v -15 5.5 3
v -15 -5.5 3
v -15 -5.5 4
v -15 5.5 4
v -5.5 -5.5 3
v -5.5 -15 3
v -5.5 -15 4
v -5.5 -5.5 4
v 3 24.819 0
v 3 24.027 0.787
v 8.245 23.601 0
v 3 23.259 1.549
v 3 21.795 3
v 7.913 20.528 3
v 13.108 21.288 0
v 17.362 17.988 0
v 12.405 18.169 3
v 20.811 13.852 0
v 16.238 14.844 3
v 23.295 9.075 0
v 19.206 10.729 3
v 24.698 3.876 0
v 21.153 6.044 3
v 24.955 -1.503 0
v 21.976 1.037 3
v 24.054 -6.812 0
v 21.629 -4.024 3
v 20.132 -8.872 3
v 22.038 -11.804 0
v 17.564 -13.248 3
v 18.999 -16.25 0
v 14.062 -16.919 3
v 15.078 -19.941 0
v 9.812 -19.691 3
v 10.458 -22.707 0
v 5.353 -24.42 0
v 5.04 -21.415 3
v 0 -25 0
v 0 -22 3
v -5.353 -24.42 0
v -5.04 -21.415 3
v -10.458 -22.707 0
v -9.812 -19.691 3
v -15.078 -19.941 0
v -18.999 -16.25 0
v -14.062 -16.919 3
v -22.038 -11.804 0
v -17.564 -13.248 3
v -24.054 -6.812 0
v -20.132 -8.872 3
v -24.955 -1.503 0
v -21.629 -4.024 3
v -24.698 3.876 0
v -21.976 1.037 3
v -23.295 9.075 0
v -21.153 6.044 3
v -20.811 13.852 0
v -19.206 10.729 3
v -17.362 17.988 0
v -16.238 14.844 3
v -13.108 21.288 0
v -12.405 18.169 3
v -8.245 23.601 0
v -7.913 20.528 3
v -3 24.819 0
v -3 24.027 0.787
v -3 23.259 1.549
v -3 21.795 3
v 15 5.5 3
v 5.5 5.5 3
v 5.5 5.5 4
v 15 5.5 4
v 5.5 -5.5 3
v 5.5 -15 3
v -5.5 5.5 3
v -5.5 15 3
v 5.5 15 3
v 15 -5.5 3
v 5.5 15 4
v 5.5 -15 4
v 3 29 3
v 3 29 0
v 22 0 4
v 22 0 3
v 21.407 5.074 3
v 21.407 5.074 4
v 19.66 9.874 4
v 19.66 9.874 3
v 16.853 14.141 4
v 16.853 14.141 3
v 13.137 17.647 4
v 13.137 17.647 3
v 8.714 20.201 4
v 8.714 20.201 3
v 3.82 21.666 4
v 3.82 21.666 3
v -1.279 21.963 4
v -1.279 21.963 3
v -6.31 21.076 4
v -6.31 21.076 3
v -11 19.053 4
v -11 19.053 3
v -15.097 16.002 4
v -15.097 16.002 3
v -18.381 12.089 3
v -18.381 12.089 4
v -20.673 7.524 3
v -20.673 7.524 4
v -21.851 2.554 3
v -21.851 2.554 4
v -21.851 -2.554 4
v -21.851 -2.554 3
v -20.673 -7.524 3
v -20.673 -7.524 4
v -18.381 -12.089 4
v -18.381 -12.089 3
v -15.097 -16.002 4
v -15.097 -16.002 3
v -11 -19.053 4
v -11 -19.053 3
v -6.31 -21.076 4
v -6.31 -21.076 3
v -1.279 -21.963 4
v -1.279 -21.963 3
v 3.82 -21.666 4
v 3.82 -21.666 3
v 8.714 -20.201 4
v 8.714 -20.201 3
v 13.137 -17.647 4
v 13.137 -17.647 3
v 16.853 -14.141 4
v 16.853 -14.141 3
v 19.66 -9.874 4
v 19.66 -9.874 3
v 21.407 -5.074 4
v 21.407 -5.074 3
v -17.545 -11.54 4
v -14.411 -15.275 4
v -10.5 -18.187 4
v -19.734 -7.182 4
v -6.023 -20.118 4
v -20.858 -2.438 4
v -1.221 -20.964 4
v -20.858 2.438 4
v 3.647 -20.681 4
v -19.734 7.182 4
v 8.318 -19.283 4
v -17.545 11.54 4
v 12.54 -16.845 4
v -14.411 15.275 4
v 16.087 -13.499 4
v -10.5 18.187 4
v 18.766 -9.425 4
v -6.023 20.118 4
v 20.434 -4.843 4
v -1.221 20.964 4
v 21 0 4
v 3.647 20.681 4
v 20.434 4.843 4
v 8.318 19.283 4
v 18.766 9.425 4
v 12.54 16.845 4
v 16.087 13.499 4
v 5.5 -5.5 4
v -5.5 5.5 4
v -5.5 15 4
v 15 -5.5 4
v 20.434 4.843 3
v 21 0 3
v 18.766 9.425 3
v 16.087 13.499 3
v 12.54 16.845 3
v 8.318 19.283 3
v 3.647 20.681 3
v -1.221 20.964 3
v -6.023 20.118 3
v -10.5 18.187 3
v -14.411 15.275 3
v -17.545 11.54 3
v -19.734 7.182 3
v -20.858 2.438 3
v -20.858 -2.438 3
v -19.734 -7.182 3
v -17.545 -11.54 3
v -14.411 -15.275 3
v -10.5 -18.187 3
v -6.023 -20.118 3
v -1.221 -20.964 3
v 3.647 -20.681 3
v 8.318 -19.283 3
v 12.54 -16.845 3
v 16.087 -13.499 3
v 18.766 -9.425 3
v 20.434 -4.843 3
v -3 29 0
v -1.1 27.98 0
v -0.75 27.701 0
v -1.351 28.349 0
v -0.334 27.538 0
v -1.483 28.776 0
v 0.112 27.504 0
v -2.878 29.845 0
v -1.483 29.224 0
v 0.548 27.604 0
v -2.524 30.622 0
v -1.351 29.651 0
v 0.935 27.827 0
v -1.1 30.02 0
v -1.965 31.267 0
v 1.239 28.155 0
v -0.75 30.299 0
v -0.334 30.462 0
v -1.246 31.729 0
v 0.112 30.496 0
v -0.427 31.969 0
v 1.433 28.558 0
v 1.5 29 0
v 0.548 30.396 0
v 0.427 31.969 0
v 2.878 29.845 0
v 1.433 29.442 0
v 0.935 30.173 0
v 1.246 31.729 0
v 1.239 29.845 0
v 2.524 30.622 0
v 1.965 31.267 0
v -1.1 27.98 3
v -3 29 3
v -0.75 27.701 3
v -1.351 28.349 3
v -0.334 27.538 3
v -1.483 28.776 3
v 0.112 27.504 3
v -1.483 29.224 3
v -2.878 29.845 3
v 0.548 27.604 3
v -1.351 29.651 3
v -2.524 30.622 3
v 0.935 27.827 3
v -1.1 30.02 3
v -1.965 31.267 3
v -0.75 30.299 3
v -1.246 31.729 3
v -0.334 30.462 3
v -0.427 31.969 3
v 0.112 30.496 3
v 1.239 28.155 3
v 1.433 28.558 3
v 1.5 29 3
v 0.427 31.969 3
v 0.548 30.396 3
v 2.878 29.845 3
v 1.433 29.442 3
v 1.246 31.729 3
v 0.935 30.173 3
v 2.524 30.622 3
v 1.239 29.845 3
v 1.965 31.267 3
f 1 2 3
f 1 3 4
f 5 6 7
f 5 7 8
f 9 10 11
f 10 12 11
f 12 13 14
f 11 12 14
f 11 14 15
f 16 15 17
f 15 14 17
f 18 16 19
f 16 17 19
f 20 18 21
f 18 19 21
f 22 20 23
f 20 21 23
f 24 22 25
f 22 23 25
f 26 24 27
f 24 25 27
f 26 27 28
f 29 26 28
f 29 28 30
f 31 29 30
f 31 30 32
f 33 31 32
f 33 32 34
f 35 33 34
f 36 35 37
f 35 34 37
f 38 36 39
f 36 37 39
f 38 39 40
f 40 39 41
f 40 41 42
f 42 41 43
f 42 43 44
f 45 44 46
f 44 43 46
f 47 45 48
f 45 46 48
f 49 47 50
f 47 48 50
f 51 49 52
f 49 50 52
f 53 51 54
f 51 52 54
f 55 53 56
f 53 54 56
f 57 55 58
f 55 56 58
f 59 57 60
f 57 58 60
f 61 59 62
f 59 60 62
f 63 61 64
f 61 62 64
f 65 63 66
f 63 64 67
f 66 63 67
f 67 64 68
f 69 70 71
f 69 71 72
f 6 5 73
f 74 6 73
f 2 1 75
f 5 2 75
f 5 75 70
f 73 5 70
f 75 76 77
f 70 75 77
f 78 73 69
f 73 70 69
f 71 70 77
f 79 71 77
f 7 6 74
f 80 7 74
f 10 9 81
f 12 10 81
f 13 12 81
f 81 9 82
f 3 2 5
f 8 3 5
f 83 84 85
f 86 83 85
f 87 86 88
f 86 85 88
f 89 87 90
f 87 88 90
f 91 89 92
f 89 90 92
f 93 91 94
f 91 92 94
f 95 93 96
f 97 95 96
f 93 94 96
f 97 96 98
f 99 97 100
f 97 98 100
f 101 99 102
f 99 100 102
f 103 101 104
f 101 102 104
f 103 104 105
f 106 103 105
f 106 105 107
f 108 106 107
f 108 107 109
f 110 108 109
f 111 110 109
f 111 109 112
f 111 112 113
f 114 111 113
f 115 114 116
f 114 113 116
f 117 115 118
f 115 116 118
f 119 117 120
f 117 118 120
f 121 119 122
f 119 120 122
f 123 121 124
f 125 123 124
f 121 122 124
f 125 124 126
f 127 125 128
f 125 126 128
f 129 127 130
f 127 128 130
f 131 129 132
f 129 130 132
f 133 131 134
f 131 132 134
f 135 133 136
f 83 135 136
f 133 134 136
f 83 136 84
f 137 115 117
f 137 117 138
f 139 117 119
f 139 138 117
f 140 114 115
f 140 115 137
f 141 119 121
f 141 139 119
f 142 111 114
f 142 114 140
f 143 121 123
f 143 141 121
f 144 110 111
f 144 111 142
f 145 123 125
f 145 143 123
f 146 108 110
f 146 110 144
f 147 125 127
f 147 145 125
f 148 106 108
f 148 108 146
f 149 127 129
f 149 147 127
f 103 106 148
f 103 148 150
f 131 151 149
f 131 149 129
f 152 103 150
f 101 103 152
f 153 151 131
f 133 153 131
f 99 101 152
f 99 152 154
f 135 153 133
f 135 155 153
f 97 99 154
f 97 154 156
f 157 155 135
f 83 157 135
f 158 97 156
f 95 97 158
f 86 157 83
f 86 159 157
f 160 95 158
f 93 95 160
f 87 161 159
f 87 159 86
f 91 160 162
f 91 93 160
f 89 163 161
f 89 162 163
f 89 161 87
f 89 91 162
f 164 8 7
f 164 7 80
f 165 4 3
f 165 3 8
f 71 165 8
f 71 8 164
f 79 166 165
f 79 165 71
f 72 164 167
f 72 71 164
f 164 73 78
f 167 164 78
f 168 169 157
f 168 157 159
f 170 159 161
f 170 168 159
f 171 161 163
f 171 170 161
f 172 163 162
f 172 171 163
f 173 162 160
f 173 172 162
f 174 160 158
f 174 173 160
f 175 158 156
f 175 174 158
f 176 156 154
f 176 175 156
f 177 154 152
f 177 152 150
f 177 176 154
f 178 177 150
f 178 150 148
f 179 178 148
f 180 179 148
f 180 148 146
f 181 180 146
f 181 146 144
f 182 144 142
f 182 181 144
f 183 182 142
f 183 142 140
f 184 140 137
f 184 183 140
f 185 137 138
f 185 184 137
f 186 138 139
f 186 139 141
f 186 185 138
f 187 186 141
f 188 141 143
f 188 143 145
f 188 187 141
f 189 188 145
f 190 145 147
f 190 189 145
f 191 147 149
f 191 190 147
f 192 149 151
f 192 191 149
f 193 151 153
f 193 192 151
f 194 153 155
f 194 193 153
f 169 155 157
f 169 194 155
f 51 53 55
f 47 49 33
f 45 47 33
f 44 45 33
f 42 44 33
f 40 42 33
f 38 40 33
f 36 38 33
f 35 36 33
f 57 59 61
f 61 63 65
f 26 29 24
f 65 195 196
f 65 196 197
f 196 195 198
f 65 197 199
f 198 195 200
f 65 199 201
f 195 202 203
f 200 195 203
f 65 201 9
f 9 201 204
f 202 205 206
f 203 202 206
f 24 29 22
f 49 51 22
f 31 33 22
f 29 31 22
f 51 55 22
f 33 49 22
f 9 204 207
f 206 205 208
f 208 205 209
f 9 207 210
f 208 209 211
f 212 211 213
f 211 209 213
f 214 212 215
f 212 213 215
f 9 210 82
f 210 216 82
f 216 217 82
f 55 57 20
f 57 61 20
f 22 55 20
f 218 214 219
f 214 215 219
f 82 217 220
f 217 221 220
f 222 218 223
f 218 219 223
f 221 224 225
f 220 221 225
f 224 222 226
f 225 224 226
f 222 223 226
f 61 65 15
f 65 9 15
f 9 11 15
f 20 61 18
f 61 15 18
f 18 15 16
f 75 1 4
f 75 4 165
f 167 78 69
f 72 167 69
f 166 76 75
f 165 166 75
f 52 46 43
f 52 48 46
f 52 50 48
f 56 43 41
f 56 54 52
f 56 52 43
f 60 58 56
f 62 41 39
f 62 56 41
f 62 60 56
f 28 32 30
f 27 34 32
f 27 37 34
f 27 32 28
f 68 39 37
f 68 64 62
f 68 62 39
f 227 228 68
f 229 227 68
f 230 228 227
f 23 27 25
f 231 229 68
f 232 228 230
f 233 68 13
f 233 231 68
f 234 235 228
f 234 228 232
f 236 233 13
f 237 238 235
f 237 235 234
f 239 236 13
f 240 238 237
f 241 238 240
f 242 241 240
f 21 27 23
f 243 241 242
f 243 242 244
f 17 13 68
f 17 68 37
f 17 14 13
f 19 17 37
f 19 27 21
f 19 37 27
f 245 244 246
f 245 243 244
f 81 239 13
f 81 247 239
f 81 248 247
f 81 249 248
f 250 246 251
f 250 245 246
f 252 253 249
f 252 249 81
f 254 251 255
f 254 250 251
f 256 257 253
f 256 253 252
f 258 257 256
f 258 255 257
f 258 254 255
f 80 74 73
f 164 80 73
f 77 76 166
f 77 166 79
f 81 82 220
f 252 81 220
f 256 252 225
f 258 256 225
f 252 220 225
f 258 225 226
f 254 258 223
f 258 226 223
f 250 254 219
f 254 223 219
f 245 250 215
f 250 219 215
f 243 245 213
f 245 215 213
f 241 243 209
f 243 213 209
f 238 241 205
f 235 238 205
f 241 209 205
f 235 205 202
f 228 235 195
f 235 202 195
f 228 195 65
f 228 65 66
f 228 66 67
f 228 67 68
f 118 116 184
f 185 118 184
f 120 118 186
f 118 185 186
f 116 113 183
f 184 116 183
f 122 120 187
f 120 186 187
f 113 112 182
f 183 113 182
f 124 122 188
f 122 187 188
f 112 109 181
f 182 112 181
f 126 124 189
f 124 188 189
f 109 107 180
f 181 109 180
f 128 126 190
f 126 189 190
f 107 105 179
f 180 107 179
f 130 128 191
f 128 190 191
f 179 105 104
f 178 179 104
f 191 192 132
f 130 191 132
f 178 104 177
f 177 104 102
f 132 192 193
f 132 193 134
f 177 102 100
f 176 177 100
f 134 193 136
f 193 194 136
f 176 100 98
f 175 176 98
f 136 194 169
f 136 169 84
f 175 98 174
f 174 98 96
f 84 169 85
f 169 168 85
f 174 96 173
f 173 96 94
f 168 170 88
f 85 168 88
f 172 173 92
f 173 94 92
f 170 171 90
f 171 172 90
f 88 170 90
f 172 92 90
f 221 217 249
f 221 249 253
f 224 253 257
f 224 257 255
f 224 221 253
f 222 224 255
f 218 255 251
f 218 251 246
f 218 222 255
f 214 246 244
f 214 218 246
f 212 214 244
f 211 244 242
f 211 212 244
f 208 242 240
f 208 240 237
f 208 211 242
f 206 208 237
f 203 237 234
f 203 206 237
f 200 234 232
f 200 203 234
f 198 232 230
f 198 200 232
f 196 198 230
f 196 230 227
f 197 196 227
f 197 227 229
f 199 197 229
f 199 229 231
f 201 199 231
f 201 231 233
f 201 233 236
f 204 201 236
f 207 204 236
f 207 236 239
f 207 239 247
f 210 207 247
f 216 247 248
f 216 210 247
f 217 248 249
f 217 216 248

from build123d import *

# Parameters (mm, degrees)
F0_R     = 25
F1_DEPTH = 3
F2_W     = 11
F2_H     = 11
F2_H_2   = 9.5
F2_W_2   = 9.5
F3_DEPTH = 1
F2_R     = 22
F2_R_2   = 21
F4_R     = 1.5
F5_DEPTH = 3
F6_SIZE  = 2.99999


# Not quite as in the source:
# - a fillet or chamfer is up to 0.001 mm smaller than in the source, because OpenCascade refuses the exact size


with BuildPart() as f1:
    # F0 (on Top) → F1 (new body)
    with BuildSketch(Plane.XY):
        Circle(F0_R)
    extrude(amount=F1_DEPTH)

    # F4 (on Top) → F5 (join, through all)
    with BuildSketch(Plane.XY):
        with BuildLine():
            Line((3, 24.819347292), (3, 29))
            ThreePointArc((3, 29), (0, 26), (-3, 29))
            Line((-3, 29), (-3, 24.819347292))
            ThreePointArc((-3, 24.819347292), (0, 25), (3, 24.819347292))
        make_face()
        with BuildLine():
            ThreePointArc((-3, 29), (0, 26), (3, 29))
            ThreePointArc((3, 29), (0, 32), (-3, 29))
        make_face()
        with Locations((0, 29)):
            Circle(F4_R, mode=Mode.SUBTRACT)
    extrude(amount=F5_DEPTH)

    # F6 (size 3 in the source; OpenCascade refuses exactly that, so slightly less here)
    f6_edges = [f1.edges().sort_by_distance(p)[0] for p in [
        (0, -25, 3),
    ]]
    chamfer(f6_edges, length=F6_SIZE)


with BuildPart() as f3:
    # F2 (on face) → F3 (new body)
    with BuildSketch(Plane.XY.offset(3)):
        Rectangle(F2_W, F2_H)
        with Locations((0, 10.25)):
            Rectangle(F2_W, F2_H_2)
        with Locations((-10.25, 0)):
            Rectangle(F2_W_2, F2_H)
        with Locations((0, -10.25)):
            Rectangle(F2_W, F2_H_2)
        with Locations((10.25, 0)):
            Rectangle(F2_W_2, F2_H)
    extrude(amount=F3_DEPTH)


with BuildPart() as f3b:
    # F2 (on face) → F3, piece 2 (new body)
    with BuildSketch(Plane.XY.offset(3)):
        Circle(F2_R)
        Circle(F2_R_2, mode=Mode.SUBTRACT)
    extrude(amount=F3_DEPTH)


solid = Compound([f1.part, f3.part, f3b.part])
